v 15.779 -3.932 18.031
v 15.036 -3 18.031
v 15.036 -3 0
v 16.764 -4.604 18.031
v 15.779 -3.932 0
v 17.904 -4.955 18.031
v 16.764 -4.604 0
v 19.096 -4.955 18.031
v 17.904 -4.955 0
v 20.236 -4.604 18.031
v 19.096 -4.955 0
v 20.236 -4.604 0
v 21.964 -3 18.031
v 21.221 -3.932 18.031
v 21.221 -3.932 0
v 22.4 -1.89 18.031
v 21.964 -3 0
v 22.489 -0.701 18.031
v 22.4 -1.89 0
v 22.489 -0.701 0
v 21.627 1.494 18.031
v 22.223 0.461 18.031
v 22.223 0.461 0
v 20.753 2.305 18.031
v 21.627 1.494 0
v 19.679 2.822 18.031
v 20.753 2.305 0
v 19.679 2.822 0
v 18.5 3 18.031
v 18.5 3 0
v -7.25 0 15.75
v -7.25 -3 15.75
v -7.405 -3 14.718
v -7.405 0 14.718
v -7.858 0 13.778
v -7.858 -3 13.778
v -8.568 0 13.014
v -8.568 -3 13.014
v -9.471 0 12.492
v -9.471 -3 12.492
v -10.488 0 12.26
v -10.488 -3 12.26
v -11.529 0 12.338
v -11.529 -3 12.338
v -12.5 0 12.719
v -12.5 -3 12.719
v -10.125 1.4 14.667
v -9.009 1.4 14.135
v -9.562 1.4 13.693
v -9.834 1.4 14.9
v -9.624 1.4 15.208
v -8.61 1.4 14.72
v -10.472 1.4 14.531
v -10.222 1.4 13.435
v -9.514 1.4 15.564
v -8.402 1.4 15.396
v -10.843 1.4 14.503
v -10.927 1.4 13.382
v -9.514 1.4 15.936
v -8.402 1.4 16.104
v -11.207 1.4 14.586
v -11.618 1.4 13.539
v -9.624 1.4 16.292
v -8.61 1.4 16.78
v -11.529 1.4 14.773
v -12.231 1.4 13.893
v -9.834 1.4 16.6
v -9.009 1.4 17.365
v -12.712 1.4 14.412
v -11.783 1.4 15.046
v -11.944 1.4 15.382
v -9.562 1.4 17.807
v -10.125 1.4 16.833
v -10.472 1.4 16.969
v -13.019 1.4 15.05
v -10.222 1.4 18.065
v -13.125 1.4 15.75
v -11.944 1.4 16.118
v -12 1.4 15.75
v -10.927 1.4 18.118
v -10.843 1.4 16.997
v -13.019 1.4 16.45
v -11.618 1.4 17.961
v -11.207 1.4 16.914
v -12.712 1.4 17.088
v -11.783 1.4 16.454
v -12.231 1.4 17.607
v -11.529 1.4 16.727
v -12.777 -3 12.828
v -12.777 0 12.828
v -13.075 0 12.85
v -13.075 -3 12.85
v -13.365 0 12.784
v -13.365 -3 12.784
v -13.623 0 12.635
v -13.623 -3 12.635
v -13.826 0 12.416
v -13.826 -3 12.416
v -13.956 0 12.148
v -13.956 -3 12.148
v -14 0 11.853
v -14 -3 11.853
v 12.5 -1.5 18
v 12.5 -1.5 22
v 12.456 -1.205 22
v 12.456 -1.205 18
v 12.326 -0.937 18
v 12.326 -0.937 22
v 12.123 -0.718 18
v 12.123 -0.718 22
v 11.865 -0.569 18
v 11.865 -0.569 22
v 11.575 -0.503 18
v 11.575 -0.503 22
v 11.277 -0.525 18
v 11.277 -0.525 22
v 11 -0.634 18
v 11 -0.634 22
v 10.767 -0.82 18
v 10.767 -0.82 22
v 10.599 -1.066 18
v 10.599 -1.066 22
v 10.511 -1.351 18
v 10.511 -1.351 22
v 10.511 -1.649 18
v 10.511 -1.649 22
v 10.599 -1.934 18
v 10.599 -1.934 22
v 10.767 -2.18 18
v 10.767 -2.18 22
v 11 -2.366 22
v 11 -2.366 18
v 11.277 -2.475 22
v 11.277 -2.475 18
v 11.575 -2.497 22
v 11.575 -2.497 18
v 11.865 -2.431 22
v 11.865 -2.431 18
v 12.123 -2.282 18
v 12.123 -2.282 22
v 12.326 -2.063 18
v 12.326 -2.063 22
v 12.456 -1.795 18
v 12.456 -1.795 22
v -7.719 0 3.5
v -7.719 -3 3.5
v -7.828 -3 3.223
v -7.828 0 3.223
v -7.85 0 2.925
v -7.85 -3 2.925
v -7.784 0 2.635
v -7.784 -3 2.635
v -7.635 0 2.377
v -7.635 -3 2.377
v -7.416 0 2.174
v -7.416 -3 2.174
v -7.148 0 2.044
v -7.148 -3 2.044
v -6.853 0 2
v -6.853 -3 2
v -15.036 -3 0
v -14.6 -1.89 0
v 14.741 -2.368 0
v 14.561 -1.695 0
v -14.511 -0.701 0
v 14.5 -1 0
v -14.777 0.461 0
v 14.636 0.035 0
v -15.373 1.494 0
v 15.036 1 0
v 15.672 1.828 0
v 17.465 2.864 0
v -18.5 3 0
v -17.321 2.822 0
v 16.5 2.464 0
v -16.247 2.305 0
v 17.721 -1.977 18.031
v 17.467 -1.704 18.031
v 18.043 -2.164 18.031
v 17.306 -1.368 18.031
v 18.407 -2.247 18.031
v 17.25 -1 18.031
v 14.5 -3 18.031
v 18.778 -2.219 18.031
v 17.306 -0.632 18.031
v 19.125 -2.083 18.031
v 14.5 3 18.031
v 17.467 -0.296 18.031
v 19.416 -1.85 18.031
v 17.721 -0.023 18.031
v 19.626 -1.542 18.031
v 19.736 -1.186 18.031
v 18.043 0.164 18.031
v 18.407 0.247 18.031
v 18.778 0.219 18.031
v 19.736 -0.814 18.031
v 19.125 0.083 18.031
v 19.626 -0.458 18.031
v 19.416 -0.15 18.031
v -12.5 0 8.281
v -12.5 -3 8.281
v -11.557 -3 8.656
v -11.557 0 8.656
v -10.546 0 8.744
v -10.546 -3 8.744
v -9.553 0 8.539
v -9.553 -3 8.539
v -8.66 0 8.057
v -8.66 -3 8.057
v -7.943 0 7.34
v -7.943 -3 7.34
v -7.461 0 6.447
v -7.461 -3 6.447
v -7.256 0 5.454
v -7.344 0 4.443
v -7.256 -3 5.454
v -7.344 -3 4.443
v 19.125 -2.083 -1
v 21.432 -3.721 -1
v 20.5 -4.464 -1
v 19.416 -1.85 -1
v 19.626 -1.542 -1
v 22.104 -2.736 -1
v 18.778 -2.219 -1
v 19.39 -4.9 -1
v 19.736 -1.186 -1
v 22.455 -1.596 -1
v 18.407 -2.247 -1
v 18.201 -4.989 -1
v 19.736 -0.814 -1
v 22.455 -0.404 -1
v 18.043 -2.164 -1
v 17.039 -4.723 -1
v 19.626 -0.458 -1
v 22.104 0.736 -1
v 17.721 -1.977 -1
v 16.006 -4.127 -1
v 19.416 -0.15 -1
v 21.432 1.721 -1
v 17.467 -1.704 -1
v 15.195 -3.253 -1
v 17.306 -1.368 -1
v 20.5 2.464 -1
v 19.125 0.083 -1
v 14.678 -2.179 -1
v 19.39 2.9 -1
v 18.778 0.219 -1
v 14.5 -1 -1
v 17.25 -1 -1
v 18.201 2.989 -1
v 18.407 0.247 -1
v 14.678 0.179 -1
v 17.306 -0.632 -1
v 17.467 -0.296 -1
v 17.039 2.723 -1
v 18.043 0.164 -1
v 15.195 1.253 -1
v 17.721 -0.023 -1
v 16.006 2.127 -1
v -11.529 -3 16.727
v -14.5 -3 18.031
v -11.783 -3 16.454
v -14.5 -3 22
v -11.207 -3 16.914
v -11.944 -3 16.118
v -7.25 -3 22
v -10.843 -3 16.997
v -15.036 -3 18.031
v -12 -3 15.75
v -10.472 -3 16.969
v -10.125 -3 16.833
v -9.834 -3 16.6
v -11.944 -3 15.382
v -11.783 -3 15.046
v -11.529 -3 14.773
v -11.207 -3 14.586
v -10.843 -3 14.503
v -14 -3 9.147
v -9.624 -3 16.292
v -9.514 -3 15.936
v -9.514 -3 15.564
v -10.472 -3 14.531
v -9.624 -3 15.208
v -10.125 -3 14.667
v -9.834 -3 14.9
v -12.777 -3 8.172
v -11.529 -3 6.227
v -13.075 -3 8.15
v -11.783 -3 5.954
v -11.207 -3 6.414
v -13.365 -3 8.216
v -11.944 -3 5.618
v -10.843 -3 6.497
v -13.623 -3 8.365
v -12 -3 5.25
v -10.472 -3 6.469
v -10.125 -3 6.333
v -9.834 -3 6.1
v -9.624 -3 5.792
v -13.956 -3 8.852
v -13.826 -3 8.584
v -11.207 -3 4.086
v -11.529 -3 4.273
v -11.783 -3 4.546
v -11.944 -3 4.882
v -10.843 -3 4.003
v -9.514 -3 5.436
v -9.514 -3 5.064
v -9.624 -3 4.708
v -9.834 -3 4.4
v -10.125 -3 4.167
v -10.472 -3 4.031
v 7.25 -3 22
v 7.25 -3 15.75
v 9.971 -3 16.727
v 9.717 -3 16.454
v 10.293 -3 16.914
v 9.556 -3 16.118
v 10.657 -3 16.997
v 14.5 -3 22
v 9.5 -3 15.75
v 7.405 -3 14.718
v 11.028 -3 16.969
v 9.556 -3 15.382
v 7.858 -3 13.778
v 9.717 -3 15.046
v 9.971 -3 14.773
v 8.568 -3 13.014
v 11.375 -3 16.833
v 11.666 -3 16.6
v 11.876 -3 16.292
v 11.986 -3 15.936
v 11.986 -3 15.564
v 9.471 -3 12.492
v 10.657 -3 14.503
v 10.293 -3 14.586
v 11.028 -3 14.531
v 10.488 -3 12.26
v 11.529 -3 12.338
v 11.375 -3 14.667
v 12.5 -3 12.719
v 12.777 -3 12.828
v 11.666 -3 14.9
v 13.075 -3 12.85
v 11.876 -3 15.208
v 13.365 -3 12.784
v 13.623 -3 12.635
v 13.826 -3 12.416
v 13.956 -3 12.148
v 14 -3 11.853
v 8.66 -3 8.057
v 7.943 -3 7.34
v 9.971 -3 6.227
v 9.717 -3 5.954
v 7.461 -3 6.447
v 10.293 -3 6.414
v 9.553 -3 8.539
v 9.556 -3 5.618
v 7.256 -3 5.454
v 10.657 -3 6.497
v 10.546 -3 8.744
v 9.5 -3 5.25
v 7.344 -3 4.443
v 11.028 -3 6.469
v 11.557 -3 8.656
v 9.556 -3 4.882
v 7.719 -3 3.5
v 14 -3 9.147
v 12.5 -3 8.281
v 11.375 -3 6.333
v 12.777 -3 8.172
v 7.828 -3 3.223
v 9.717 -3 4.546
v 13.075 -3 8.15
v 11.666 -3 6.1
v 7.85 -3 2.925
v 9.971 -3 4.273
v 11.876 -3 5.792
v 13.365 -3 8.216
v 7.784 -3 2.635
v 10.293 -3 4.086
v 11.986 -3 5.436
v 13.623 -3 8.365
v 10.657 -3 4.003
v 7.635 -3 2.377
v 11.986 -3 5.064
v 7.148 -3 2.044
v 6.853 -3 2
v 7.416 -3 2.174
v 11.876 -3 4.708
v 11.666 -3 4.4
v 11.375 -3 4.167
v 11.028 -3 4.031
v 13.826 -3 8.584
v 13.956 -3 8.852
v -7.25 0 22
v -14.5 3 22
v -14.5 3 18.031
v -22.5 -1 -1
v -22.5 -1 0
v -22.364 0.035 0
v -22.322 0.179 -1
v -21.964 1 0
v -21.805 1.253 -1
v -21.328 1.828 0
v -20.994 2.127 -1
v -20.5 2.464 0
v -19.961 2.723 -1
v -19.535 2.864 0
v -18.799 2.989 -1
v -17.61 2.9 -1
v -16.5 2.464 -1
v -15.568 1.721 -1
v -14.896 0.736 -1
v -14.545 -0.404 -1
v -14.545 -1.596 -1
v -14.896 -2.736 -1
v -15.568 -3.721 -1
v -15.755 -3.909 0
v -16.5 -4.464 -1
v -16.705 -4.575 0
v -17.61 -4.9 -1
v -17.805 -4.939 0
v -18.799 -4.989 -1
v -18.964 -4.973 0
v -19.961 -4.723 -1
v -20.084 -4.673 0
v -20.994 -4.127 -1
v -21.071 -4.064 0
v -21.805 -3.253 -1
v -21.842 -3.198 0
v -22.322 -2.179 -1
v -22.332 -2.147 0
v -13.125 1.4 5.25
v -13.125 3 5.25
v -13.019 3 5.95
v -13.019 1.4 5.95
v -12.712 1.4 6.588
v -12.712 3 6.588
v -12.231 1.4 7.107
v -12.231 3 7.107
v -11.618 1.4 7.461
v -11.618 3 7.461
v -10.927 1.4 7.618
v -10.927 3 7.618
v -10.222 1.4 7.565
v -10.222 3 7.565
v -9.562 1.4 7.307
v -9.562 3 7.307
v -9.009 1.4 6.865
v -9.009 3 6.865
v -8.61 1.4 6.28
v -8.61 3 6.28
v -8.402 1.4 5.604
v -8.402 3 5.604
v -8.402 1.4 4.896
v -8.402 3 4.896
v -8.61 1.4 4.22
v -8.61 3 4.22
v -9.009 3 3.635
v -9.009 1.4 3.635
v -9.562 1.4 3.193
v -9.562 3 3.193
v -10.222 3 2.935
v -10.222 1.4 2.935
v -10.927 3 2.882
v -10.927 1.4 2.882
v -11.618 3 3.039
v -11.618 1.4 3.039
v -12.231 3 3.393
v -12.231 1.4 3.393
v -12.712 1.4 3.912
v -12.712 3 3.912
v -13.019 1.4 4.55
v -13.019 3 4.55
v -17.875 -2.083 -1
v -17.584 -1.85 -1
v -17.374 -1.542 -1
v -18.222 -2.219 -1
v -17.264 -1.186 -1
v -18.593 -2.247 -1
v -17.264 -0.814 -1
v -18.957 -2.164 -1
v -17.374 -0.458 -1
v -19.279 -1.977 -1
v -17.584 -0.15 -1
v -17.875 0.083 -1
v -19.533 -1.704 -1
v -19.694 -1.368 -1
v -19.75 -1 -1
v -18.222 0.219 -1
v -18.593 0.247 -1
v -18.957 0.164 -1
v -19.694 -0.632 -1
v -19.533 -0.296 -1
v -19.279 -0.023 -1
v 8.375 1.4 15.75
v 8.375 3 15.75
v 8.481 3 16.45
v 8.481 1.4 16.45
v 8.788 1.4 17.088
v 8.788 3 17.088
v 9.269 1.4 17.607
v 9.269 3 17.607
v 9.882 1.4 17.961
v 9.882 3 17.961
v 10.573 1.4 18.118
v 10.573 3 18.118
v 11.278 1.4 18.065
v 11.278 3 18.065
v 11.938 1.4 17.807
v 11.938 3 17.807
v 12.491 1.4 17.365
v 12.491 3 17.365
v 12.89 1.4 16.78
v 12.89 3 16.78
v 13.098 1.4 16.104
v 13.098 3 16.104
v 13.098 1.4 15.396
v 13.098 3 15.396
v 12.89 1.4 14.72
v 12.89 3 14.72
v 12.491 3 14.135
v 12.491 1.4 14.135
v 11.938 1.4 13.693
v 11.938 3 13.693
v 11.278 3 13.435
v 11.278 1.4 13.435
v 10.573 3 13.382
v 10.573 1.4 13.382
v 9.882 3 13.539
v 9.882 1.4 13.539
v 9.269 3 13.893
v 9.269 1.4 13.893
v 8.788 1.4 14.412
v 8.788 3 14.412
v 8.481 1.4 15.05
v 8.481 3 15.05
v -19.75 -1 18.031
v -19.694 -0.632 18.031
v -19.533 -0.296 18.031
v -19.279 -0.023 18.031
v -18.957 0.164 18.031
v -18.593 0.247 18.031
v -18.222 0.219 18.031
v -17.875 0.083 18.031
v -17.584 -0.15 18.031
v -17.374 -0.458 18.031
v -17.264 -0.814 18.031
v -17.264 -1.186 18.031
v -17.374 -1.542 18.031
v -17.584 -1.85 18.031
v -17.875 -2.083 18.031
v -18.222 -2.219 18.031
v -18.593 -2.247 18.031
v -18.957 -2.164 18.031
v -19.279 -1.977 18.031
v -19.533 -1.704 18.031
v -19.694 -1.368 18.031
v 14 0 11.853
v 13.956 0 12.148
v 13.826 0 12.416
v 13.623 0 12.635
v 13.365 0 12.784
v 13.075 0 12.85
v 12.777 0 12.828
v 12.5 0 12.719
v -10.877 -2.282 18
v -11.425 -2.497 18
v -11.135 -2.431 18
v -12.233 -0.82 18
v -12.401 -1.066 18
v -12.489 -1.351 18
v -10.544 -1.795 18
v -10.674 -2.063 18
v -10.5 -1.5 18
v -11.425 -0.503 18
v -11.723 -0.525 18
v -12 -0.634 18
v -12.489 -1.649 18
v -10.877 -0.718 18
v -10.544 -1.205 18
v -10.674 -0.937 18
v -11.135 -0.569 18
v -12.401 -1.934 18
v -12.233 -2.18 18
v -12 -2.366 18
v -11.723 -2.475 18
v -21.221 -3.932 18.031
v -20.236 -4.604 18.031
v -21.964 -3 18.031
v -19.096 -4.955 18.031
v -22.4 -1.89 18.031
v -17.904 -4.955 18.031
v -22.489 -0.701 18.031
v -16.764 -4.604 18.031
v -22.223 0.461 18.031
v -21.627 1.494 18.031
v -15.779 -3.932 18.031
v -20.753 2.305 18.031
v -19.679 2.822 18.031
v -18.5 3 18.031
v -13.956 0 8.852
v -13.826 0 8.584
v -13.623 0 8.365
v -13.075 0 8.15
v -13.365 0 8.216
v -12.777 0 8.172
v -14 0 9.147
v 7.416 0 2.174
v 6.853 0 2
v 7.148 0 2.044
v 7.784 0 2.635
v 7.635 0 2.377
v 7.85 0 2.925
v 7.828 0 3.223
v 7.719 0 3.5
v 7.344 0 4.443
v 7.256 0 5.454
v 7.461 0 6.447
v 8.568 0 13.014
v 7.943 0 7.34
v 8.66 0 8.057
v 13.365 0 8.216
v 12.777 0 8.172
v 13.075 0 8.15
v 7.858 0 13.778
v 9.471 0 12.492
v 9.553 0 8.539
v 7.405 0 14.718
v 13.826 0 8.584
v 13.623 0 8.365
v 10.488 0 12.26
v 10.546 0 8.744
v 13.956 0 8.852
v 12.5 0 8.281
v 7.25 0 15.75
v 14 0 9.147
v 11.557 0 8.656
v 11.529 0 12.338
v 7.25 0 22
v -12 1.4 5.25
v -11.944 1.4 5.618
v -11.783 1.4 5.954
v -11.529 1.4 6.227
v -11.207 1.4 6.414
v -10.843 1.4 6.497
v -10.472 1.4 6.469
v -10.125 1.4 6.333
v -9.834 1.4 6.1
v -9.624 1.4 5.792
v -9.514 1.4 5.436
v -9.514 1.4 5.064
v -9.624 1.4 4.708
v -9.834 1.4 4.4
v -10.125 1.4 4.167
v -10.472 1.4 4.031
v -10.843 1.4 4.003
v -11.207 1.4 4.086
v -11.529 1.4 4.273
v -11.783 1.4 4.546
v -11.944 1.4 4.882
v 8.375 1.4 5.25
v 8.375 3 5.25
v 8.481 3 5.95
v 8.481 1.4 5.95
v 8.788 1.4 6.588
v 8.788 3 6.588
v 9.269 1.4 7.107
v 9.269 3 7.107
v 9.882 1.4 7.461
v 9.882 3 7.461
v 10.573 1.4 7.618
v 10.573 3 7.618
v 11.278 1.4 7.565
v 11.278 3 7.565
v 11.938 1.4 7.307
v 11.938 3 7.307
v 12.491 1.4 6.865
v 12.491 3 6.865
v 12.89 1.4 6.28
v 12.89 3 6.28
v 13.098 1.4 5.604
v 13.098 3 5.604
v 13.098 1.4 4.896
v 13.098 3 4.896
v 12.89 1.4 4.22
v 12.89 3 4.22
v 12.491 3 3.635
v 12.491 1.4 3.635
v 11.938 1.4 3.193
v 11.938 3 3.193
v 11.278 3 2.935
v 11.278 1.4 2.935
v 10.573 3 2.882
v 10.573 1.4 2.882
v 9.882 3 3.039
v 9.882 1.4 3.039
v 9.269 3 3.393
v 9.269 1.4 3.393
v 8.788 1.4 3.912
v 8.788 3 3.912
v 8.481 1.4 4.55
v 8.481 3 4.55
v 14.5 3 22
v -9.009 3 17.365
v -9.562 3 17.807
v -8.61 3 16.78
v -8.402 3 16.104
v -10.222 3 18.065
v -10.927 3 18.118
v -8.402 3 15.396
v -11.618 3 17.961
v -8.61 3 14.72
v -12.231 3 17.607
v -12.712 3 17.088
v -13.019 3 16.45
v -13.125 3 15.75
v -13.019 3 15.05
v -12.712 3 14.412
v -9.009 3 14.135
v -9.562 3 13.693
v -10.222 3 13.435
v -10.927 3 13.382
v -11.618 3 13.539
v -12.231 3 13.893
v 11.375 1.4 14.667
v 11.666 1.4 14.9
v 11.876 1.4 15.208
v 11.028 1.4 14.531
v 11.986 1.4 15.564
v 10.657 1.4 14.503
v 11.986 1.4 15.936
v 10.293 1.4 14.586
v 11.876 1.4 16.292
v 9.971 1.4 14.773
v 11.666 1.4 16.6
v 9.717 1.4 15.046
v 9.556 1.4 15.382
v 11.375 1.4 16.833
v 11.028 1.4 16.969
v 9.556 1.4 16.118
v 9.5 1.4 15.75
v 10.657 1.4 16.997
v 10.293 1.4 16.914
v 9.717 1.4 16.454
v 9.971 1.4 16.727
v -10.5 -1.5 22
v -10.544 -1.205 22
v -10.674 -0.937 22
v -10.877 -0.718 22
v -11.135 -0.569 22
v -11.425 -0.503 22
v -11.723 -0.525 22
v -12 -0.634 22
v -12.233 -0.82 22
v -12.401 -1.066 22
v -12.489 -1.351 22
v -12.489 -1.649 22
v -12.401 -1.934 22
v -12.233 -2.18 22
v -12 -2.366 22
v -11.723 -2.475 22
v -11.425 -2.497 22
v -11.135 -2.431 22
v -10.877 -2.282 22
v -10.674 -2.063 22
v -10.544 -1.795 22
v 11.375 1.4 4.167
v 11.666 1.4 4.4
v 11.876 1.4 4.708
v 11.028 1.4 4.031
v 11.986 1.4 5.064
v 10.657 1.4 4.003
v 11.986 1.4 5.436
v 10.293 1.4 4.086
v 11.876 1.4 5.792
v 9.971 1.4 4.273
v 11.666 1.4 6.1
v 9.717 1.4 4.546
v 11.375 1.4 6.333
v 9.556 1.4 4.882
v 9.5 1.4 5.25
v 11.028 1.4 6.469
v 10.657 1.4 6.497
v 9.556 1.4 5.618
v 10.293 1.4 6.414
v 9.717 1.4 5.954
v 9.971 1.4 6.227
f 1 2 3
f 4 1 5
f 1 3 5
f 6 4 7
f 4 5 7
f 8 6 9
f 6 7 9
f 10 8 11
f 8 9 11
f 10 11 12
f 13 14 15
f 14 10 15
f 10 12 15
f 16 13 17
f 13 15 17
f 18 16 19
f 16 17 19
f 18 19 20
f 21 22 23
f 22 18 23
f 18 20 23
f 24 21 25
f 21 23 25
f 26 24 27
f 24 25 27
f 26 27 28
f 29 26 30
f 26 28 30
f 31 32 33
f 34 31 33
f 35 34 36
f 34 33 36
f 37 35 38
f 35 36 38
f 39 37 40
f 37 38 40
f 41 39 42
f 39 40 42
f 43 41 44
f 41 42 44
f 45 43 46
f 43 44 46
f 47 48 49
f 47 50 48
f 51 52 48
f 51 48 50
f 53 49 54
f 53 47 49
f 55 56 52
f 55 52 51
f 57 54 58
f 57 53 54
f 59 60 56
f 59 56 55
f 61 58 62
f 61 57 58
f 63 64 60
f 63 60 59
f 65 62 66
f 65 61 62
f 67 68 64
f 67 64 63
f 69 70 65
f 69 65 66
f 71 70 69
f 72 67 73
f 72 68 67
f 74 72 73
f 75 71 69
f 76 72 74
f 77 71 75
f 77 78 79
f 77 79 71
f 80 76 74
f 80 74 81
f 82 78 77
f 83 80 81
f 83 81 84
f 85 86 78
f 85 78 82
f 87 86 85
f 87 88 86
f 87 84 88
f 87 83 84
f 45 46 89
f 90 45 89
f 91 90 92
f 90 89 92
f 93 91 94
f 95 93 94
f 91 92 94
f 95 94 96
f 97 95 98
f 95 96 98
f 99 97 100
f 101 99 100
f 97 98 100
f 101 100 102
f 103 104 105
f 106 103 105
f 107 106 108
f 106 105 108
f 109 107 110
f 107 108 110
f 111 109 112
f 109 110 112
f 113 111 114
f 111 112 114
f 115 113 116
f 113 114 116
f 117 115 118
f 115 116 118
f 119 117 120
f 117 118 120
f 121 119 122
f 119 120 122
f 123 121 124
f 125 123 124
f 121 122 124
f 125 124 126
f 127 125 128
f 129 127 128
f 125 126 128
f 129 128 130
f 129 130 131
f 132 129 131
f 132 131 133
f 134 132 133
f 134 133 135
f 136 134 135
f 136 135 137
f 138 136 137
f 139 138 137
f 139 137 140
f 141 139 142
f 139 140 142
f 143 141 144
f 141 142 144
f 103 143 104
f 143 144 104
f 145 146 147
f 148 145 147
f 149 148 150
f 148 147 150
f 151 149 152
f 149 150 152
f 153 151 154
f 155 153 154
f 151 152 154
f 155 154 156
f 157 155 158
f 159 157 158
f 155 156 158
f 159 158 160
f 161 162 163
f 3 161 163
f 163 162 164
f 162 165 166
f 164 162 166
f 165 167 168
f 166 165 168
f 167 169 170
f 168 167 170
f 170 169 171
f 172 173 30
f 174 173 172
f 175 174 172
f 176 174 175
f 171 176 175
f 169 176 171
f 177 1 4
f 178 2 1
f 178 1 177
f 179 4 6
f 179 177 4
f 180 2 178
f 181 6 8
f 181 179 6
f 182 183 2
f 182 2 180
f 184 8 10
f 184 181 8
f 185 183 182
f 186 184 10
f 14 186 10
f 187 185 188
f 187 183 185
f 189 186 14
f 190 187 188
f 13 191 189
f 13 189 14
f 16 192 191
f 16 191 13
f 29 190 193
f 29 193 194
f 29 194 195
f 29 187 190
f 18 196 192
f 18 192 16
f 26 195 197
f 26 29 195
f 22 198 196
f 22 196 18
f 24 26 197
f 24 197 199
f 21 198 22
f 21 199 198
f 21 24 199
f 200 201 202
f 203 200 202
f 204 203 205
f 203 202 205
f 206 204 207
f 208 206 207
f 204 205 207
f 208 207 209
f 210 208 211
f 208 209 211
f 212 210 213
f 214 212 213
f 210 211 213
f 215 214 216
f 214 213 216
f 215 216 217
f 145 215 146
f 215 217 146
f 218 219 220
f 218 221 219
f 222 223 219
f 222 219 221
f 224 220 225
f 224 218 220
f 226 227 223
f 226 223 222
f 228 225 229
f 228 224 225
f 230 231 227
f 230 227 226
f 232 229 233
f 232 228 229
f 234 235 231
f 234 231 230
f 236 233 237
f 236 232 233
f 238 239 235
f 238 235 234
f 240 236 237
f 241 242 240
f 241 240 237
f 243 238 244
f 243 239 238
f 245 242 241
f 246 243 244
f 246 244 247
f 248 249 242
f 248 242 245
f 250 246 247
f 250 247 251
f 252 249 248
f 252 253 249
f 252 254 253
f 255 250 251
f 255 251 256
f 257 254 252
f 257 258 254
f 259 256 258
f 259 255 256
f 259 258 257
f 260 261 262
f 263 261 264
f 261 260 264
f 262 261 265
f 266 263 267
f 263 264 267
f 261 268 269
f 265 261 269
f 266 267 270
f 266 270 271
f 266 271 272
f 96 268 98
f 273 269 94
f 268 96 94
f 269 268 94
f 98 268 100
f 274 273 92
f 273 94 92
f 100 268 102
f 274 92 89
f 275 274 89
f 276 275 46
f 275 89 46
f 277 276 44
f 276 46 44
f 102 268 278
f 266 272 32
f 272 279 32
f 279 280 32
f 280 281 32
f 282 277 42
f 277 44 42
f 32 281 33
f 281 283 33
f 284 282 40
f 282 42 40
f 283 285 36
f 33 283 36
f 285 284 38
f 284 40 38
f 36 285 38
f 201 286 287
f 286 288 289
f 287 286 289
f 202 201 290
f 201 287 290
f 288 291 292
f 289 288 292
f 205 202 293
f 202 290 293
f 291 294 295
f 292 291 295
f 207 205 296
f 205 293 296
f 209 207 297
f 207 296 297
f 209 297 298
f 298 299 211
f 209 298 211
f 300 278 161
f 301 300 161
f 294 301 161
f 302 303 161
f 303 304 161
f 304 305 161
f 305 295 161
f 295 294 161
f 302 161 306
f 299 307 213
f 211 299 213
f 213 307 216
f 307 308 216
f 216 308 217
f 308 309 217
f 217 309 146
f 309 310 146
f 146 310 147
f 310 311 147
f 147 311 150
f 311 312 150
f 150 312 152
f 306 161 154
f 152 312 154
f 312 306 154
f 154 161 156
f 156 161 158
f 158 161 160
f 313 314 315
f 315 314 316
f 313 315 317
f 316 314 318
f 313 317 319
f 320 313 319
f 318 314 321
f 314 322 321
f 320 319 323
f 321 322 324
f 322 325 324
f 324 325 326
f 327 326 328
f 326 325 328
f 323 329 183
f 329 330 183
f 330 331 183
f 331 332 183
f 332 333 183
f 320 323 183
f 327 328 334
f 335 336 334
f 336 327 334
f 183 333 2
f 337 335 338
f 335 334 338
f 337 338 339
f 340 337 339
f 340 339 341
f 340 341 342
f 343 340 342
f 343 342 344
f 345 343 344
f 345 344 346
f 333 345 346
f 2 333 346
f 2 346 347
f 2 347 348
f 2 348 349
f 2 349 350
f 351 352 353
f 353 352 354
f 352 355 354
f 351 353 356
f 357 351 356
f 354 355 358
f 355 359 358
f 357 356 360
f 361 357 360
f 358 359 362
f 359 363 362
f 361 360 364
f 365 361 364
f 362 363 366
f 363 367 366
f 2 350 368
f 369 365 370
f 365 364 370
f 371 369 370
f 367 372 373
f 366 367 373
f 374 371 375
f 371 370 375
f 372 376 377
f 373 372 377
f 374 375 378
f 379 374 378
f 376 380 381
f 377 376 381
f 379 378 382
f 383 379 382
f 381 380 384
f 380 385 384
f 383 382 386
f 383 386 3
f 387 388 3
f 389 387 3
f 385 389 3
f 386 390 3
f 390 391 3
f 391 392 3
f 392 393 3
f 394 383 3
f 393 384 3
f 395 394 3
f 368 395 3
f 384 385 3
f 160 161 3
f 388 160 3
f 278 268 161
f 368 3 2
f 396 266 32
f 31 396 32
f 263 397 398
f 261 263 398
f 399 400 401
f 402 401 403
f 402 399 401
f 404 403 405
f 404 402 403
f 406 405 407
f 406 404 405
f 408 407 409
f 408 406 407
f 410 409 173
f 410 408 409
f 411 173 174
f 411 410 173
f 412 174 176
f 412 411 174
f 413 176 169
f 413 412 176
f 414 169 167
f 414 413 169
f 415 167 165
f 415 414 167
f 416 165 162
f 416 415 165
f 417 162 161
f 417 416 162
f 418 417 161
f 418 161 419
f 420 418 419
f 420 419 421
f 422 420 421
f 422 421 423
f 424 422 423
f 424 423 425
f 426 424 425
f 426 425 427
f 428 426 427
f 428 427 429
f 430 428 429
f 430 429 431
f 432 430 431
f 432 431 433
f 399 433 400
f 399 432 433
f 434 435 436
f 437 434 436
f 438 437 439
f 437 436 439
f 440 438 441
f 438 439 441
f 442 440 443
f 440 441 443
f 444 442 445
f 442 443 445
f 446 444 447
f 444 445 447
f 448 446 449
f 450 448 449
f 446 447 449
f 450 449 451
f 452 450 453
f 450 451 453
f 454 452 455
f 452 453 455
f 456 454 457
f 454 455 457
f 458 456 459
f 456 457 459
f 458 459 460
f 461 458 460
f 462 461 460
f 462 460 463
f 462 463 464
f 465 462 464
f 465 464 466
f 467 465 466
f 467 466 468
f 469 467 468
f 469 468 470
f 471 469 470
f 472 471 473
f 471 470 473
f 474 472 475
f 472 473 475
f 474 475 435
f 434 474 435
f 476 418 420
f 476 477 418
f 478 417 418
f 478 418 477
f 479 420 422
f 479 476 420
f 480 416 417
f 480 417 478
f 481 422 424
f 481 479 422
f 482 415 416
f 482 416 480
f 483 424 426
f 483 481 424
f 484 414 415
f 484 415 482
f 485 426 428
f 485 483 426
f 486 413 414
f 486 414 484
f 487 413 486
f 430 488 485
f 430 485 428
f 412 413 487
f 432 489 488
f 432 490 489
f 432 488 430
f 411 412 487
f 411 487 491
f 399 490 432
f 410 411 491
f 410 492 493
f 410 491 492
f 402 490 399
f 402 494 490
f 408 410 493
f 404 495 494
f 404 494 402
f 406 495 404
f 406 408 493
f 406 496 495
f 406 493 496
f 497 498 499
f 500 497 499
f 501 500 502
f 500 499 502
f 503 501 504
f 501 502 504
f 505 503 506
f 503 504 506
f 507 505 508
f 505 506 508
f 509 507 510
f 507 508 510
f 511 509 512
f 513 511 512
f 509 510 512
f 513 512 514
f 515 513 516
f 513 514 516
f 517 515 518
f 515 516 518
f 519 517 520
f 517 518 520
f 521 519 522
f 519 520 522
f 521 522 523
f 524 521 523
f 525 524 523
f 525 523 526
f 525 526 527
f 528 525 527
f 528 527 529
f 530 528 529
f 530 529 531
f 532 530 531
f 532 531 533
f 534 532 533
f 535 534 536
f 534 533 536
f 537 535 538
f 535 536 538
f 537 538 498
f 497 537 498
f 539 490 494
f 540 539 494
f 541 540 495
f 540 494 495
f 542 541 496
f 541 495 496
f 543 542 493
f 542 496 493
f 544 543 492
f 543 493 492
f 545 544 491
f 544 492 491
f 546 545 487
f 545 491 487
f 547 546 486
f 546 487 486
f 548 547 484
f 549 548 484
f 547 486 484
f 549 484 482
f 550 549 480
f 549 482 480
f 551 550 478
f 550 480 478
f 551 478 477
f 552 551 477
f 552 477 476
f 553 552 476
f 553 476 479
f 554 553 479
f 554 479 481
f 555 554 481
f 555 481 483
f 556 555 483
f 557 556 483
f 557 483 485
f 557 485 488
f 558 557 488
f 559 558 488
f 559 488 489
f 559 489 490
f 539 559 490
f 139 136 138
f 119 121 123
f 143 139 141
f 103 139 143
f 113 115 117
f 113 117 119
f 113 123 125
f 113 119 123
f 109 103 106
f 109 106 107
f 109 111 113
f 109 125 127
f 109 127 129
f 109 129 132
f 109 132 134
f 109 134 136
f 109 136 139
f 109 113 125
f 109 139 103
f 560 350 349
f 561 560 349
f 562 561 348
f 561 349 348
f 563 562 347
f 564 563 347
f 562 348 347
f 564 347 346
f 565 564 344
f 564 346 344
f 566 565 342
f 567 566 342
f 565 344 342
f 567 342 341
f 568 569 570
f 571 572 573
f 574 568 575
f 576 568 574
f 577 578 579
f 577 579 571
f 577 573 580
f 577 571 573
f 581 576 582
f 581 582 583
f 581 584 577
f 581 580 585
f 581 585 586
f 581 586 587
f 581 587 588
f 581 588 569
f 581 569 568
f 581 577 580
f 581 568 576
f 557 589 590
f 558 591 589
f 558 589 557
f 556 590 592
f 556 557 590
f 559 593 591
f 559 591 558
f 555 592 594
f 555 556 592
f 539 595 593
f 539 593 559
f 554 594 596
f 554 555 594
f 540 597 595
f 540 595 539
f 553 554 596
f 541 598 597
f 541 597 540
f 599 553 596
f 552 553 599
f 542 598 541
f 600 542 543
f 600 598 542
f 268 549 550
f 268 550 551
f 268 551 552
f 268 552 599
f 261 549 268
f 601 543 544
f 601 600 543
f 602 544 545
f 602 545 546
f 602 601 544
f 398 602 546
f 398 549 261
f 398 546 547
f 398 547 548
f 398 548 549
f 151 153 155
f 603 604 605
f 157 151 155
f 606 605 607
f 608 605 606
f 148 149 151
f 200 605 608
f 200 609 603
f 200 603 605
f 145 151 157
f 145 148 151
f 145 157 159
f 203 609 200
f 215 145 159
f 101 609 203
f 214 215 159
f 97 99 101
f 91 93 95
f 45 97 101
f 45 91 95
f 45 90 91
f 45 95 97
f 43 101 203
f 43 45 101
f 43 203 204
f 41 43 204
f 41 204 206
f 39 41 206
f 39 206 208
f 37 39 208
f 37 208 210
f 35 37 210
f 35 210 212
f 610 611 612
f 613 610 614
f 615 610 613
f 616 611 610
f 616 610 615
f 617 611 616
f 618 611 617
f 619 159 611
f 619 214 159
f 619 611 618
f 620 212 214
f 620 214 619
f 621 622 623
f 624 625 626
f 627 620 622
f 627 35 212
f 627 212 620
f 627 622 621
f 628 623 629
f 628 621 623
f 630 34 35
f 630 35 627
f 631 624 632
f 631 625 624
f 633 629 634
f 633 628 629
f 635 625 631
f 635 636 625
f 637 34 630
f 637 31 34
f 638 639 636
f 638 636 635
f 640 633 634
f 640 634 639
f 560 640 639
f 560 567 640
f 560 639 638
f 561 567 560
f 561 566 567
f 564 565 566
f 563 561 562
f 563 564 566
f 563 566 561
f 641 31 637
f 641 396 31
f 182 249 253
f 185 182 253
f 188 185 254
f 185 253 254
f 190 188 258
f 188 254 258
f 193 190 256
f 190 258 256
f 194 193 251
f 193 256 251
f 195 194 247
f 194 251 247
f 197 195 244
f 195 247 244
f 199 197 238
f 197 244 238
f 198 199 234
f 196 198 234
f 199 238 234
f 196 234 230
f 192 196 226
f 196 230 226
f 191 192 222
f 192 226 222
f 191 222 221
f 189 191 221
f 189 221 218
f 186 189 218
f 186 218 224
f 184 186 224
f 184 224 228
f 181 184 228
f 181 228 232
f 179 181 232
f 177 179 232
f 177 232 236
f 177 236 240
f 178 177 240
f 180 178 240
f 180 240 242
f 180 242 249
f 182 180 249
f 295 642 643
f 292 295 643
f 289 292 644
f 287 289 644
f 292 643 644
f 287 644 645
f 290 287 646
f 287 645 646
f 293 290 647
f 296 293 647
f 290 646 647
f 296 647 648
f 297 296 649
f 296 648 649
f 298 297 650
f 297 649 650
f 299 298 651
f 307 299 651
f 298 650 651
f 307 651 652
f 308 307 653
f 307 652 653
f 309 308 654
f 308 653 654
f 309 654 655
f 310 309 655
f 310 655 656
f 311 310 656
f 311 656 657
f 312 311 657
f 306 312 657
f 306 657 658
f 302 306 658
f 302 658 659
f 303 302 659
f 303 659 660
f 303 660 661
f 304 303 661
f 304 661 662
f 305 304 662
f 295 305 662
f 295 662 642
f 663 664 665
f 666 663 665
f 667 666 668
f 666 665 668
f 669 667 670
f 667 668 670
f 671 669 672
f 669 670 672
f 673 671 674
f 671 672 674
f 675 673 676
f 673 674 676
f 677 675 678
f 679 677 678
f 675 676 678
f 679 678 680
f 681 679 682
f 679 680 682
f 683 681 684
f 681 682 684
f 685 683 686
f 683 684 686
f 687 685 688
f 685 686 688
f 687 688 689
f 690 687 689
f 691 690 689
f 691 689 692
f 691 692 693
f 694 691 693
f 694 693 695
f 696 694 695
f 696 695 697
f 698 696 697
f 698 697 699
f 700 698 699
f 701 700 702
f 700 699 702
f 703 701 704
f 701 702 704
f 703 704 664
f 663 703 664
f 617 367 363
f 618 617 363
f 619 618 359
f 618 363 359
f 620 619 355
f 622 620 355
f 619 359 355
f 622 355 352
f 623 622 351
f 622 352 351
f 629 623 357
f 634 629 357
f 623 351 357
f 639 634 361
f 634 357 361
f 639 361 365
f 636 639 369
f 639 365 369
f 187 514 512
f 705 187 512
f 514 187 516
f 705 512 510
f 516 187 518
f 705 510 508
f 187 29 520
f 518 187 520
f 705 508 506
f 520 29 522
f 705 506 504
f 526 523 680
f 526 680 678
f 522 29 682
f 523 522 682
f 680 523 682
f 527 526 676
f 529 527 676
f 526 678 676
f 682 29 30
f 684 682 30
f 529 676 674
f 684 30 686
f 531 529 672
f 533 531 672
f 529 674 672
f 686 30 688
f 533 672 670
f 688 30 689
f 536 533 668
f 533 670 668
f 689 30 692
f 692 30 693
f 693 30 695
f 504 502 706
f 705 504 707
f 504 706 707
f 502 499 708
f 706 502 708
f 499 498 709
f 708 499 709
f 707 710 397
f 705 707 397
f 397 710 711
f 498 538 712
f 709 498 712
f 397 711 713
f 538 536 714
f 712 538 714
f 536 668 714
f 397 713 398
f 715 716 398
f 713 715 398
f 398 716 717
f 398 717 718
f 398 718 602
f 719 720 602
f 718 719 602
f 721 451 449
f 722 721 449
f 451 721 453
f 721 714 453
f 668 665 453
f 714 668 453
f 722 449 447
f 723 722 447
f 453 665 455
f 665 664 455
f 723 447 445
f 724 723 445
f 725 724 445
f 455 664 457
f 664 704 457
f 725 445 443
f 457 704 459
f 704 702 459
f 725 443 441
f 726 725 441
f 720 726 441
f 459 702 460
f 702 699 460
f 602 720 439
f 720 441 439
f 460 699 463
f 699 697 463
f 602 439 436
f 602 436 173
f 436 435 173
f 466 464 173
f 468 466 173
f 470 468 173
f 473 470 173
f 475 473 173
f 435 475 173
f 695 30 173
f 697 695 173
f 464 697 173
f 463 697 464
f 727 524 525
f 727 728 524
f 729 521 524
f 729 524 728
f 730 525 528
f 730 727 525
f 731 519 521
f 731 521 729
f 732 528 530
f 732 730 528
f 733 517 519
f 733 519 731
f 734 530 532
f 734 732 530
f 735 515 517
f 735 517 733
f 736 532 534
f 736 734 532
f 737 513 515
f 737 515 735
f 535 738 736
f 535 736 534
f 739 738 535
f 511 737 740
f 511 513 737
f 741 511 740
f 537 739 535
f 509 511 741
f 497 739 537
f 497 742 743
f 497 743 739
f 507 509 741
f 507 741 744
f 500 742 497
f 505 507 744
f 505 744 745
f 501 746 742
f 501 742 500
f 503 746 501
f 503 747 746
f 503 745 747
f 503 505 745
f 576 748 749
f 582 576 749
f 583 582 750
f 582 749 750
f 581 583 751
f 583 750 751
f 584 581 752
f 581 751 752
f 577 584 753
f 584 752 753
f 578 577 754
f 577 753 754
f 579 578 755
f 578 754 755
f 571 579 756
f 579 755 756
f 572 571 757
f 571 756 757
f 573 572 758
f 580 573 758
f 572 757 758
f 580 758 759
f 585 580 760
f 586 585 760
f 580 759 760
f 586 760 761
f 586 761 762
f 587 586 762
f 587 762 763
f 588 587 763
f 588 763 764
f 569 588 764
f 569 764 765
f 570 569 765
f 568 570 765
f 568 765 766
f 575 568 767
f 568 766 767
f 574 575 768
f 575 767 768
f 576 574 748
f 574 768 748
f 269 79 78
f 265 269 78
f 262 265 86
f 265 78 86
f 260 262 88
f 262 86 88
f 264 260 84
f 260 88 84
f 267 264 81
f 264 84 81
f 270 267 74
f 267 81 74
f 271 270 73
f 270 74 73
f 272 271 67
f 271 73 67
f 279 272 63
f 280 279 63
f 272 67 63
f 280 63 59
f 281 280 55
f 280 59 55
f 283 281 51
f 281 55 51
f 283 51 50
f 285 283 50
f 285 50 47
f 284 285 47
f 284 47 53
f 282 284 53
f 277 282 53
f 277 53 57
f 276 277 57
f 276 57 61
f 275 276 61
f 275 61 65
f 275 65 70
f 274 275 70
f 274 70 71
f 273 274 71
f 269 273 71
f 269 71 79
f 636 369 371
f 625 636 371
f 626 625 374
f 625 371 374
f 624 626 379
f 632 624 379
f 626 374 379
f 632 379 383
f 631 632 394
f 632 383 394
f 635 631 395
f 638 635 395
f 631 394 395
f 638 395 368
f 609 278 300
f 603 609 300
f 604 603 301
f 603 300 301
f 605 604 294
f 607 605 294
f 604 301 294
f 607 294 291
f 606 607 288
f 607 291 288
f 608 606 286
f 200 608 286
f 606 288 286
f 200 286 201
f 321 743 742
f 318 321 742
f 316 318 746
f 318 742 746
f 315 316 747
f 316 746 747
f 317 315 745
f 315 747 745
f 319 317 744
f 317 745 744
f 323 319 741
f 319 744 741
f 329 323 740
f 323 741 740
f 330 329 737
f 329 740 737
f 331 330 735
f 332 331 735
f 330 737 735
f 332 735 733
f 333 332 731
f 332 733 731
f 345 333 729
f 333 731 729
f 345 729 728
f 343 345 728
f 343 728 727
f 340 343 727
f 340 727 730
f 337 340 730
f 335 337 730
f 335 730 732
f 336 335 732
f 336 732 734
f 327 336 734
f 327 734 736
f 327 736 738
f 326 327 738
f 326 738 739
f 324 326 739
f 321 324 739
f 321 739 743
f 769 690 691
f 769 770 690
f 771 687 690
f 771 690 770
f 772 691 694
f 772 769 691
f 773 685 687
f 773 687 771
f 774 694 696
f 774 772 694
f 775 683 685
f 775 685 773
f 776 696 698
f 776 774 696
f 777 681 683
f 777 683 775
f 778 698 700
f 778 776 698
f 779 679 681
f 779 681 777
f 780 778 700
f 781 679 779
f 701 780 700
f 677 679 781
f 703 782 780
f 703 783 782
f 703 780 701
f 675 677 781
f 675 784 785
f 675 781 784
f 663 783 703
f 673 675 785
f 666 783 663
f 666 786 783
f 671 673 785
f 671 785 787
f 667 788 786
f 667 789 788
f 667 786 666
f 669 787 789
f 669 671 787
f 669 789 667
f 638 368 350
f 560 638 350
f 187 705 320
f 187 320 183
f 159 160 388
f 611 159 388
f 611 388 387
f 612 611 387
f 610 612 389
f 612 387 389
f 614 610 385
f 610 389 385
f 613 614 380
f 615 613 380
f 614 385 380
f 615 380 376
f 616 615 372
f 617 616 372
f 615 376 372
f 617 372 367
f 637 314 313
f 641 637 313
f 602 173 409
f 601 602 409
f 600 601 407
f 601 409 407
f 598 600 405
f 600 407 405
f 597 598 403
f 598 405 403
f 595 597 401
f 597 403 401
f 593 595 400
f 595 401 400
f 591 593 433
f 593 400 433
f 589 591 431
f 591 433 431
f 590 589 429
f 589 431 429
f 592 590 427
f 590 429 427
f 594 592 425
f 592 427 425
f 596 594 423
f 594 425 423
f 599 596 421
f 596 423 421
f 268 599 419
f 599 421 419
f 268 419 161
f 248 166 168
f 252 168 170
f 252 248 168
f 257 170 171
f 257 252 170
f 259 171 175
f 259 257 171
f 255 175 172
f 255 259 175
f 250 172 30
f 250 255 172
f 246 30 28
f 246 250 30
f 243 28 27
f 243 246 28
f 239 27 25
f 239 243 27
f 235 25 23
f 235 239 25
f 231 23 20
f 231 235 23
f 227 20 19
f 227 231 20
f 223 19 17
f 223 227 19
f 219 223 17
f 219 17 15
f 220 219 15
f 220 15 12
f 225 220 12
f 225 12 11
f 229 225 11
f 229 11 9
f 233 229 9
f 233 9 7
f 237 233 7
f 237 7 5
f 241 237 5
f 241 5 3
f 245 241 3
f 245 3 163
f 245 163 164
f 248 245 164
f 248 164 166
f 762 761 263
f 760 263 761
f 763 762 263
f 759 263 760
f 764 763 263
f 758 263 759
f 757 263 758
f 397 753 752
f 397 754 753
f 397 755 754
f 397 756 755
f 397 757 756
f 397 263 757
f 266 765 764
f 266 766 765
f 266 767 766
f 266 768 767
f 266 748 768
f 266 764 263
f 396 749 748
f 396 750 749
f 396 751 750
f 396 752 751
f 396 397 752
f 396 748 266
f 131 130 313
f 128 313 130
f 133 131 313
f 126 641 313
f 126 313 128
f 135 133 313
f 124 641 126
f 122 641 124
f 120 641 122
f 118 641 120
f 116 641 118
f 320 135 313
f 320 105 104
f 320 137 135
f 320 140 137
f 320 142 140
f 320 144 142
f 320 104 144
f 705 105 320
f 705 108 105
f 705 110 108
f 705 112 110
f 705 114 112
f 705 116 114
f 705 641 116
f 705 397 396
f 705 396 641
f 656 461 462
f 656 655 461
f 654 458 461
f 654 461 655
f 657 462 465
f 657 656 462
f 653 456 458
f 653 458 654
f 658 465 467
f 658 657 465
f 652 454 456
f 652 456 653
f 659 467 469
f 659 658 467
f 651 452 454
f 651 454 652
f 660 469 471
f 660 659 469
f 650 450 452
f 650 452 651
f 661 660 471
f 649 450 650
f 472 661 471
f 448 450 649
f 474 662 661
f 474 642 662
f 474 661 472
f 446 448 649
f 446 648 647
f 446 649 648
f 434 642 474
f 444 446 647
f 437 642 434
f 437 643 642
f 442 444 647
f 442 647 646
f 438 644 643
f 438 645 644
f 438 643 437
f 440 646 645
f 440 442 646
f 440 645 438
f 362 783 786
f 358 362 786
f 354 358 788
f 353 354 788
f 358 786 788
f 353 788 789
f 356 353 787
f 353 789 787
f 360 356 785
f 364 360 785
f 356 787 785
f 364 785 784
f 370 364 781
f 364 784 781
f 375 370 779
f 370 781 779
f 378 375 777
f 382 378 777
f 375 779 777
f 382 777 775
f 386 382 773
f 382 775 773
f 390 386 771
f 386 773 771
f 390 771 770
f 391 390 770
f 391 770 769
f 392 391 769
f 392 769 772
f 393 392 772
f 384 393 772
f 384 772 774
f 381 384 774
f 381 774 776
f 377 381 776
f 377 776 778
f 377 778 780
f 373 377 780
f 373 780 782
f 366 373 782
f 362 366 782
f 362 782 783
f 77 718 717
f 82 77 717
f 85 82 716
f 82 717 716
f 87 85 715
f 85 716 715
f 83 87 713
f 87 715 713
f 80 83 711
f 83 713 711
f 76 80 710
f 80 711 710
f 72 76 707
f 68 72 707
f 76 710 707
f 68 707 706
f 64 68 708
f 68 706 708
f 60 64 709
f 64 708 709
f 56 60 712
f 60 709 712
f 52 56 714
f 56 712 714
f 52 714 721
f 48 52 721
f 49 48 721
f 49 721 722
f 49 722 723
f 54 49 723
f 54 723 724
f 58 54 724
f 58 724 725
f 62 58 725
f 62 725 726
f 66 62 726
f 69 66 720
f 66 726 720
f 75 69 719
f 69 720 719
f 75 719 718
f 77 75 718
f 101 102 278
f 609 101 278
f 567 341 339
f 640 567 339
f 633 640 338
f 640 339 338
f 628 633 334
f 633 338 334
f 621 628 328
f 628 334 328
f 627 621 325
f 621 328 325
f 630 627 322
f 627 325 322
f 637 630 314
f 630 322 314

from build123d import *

# Parameters (mm, degrees)
BOSS_EXTRUDE1_DEPTH = 22
SKETCH2_W           = 8
SKETCH2_H           = 3.96875
CUT_EXTRUDE1_DEPTH  = 33.46921619
BOSS_EXTRUDE2_START = 1
SKETCH3_R           = 4
BOSS_EXTRUDE2_DEPTH = 1
SKETCH4_R           = 1.25
CUT_EXTRUDE2_DEPTH  = 33.56148031
SKETCH5_R           = 1.25
CUT_EXTRUDE3_DEPTH  = 33.46921619
CUT_EXTRUDE4_DEPTH  = 3
SKETCH7_R           = 1
CUT_EXTRUDE5_DEPTH  = 4
SKETCH8_R           = 2.375
CUT_EXTRUDE6_DEPTH  = 1.6


with BuildPart() as part:
    # Sketch1 → Boss-Extrude1 (new body)
    with BuildSketch(Plane.XY):
        with BuildLine():
            Line((18.5, 3), (-18.5, 3))
            ThreePointArc((-18.5, 3), (-21.964101615, -3), (-15.035898385, -3))
            Line((-15.035898385, -3), (15.035898385, -3))
            ThreePointArc((15.035898385, -3), (21.964101615, -3), (18.5, 3))
        make_face()
    extrude(amount=BOSS_EXTRUDE1_DEPTH)

    # Sketch2 → Cut-Extrude1 (cut, through all)
    with BuildSketch(Plane(origin=(0, 3, 0), x_dir=(1, 0, 0), z_dir=(0, 1, 0))):
        with Locations((-18.5, -20.015625)):
            Rectangle(SKETCH2_W, SKETCH2_H)
        with Locations((18.5, -20.015625)):
            Rectangle(SKETCH2_W, SKETCH2_H)
    extrude(amount=-CUT_EXTRUDE1_DEPTH, mode=Mode.SUBTRACT)

    # Sketch3 → Boss-Extrude2 (add)
    with BuildSketch(Plane(origin=(0, 0, 0), x_dir=(-1, 0, 0), z_dir=(0, 0, -1)).offset(BOSS_EXTRUDE2_START)):
        with Locations((-18.5, -1)):
            Circle(SKETCH3_R)
        with Locations((18.5, -1)):
            Circle(SKETCH3_R)
    extrude(amount=-BOSS_EXTRUDE2_DEPTH)

    # Sketch4 → Cut-Extrude2 (cut, through all)
    with BuildSketch(Plane(origin=(0, 0, -1), x_dir=(-1, 0, 0), z_dir=(0, 0, -1))):
        with Locations((-18.5, -1)):
            Circle(SKETCH4_R)
        with Locations((18.5, -1)):
            Circle(SKETCH4_R)
    extrude(amount=-CUT_EXTRUDE2_DEPTH, mode=Mode.SUBTRACT)

    # Sketch5 → Cut-Extrude3 (cut, through all)
    with BuildSketch(Plane(origin=(0, 3, 0), x_dir=(1, 0, 0), z_dir=(0, 1, 0))):
        with Locations((-10.75, -5.25)):
            Circle(SKETCH5_R)
        with Locations((10.75, -5.25)):
            Circle(SKETCH5_R)
        with Locations((10.75, -15.75)):
            Circle(SKETCH5_R)
        with Locations((-10.75, -15.75)):
            Circle(SKETCH5_R)
    extrude(amount=-CUT_EXTRUDE3_DEPTH, mode=Mode.SUBTRACT)

    # Sketch6 → Cut-Extrude4 (cut)
    with BuildSketch(Plane.XZ.offset(3)):
        with BuildLine():
            Line((-6.852885683, 2), (6.852885683, 2))
            ThreePointArc((6.852885683, 2), (7.718911087, 2.5), (7.718911087, 3.5))
            ThreePointArc((7.718911087, 3.5), (8.275126266, 7.724873734), (12.5, 8.281088913))
            ThreePointArc((12.5, 8.281088913), (13.5, 8.281088913), (14, 9.147114317))
            Line((14, 9.147114317), (14, 11.852885683))
            ThreePointArc((14, 11.852885683), (13.5, 12.718911087), (12.5, 12.718911087))
            ThreePointArc((12.5, 12.718911087), (9, 12.718911087), (7.25, 15.75))
            Line((7.25, 15.75), (7.25, 22))
            Line((7.25, 22), (-7.25, 22))
            Line((-7.25, 22), (-7.25, 15.75))
            ThreePointArc((-7.25, 15.75), (-9, 12.718911087), (-12.5, 12.718911087))
            ThreePointArc((-12.5, 12.718911087), (-13.5, 12.718911087), (-14, 11.852885683))
            Line((-14, 11.852885683), (-14, 9.147114317))
            ThreePointArc((-14, 9.147114317), (-13.5, 8.281088913), (-12.5, 8.281088913))
            ThreePointArc((-12.5, 8.281088913), (-8.275126266, 7.724873734), (-7.718911087, 3.5))
            ThreePointArc((-7.718911087, 3.5), (-7.718911087, 2.5), (-6.852885683, 2))
        make_face()
    extrude(amount=-CUT_EXTRUDE4_DEPTH, mode=Mode.SUBTRACT)

    # Sketch7 → Cut-Extrude5 (cut)
    with BuildSketch(Plane.XY.offset(22)):
        with Locations((-11.5, -1.5)):
            Circle(SKETCH7_R)
        with Locations((11.5, -1.5)):
            Circle(SKETCH7_R)
    extrude(amount=-CUT_EXTRUDE5_DEPTH, mode=Mode.SUBTRACT)

    # Sketch8 → Cut-Extrude6 (cut)
    with BuildSketch(Plane(origin=(0, 3, 0), x_dir=(1, 0, 0), z_dir=(0, 1, 0))):
        with Locations((-10.75, -5.25)):
            Circle(SKETCH8_R)
        with Locations((10.75, -5.25)):
            Circle(SKETCH8_R)
        with Locations((10.75, -15.75)):
            Circle(SKETCH8_R)
        with Locations((-10.75, -15.75)):
            Circle(SKETCH8_R)
    extrude(amount=-CUT_EXTRUDE6_DEPTH, mode=Mode.SUBTRACT)


solid = part.part
